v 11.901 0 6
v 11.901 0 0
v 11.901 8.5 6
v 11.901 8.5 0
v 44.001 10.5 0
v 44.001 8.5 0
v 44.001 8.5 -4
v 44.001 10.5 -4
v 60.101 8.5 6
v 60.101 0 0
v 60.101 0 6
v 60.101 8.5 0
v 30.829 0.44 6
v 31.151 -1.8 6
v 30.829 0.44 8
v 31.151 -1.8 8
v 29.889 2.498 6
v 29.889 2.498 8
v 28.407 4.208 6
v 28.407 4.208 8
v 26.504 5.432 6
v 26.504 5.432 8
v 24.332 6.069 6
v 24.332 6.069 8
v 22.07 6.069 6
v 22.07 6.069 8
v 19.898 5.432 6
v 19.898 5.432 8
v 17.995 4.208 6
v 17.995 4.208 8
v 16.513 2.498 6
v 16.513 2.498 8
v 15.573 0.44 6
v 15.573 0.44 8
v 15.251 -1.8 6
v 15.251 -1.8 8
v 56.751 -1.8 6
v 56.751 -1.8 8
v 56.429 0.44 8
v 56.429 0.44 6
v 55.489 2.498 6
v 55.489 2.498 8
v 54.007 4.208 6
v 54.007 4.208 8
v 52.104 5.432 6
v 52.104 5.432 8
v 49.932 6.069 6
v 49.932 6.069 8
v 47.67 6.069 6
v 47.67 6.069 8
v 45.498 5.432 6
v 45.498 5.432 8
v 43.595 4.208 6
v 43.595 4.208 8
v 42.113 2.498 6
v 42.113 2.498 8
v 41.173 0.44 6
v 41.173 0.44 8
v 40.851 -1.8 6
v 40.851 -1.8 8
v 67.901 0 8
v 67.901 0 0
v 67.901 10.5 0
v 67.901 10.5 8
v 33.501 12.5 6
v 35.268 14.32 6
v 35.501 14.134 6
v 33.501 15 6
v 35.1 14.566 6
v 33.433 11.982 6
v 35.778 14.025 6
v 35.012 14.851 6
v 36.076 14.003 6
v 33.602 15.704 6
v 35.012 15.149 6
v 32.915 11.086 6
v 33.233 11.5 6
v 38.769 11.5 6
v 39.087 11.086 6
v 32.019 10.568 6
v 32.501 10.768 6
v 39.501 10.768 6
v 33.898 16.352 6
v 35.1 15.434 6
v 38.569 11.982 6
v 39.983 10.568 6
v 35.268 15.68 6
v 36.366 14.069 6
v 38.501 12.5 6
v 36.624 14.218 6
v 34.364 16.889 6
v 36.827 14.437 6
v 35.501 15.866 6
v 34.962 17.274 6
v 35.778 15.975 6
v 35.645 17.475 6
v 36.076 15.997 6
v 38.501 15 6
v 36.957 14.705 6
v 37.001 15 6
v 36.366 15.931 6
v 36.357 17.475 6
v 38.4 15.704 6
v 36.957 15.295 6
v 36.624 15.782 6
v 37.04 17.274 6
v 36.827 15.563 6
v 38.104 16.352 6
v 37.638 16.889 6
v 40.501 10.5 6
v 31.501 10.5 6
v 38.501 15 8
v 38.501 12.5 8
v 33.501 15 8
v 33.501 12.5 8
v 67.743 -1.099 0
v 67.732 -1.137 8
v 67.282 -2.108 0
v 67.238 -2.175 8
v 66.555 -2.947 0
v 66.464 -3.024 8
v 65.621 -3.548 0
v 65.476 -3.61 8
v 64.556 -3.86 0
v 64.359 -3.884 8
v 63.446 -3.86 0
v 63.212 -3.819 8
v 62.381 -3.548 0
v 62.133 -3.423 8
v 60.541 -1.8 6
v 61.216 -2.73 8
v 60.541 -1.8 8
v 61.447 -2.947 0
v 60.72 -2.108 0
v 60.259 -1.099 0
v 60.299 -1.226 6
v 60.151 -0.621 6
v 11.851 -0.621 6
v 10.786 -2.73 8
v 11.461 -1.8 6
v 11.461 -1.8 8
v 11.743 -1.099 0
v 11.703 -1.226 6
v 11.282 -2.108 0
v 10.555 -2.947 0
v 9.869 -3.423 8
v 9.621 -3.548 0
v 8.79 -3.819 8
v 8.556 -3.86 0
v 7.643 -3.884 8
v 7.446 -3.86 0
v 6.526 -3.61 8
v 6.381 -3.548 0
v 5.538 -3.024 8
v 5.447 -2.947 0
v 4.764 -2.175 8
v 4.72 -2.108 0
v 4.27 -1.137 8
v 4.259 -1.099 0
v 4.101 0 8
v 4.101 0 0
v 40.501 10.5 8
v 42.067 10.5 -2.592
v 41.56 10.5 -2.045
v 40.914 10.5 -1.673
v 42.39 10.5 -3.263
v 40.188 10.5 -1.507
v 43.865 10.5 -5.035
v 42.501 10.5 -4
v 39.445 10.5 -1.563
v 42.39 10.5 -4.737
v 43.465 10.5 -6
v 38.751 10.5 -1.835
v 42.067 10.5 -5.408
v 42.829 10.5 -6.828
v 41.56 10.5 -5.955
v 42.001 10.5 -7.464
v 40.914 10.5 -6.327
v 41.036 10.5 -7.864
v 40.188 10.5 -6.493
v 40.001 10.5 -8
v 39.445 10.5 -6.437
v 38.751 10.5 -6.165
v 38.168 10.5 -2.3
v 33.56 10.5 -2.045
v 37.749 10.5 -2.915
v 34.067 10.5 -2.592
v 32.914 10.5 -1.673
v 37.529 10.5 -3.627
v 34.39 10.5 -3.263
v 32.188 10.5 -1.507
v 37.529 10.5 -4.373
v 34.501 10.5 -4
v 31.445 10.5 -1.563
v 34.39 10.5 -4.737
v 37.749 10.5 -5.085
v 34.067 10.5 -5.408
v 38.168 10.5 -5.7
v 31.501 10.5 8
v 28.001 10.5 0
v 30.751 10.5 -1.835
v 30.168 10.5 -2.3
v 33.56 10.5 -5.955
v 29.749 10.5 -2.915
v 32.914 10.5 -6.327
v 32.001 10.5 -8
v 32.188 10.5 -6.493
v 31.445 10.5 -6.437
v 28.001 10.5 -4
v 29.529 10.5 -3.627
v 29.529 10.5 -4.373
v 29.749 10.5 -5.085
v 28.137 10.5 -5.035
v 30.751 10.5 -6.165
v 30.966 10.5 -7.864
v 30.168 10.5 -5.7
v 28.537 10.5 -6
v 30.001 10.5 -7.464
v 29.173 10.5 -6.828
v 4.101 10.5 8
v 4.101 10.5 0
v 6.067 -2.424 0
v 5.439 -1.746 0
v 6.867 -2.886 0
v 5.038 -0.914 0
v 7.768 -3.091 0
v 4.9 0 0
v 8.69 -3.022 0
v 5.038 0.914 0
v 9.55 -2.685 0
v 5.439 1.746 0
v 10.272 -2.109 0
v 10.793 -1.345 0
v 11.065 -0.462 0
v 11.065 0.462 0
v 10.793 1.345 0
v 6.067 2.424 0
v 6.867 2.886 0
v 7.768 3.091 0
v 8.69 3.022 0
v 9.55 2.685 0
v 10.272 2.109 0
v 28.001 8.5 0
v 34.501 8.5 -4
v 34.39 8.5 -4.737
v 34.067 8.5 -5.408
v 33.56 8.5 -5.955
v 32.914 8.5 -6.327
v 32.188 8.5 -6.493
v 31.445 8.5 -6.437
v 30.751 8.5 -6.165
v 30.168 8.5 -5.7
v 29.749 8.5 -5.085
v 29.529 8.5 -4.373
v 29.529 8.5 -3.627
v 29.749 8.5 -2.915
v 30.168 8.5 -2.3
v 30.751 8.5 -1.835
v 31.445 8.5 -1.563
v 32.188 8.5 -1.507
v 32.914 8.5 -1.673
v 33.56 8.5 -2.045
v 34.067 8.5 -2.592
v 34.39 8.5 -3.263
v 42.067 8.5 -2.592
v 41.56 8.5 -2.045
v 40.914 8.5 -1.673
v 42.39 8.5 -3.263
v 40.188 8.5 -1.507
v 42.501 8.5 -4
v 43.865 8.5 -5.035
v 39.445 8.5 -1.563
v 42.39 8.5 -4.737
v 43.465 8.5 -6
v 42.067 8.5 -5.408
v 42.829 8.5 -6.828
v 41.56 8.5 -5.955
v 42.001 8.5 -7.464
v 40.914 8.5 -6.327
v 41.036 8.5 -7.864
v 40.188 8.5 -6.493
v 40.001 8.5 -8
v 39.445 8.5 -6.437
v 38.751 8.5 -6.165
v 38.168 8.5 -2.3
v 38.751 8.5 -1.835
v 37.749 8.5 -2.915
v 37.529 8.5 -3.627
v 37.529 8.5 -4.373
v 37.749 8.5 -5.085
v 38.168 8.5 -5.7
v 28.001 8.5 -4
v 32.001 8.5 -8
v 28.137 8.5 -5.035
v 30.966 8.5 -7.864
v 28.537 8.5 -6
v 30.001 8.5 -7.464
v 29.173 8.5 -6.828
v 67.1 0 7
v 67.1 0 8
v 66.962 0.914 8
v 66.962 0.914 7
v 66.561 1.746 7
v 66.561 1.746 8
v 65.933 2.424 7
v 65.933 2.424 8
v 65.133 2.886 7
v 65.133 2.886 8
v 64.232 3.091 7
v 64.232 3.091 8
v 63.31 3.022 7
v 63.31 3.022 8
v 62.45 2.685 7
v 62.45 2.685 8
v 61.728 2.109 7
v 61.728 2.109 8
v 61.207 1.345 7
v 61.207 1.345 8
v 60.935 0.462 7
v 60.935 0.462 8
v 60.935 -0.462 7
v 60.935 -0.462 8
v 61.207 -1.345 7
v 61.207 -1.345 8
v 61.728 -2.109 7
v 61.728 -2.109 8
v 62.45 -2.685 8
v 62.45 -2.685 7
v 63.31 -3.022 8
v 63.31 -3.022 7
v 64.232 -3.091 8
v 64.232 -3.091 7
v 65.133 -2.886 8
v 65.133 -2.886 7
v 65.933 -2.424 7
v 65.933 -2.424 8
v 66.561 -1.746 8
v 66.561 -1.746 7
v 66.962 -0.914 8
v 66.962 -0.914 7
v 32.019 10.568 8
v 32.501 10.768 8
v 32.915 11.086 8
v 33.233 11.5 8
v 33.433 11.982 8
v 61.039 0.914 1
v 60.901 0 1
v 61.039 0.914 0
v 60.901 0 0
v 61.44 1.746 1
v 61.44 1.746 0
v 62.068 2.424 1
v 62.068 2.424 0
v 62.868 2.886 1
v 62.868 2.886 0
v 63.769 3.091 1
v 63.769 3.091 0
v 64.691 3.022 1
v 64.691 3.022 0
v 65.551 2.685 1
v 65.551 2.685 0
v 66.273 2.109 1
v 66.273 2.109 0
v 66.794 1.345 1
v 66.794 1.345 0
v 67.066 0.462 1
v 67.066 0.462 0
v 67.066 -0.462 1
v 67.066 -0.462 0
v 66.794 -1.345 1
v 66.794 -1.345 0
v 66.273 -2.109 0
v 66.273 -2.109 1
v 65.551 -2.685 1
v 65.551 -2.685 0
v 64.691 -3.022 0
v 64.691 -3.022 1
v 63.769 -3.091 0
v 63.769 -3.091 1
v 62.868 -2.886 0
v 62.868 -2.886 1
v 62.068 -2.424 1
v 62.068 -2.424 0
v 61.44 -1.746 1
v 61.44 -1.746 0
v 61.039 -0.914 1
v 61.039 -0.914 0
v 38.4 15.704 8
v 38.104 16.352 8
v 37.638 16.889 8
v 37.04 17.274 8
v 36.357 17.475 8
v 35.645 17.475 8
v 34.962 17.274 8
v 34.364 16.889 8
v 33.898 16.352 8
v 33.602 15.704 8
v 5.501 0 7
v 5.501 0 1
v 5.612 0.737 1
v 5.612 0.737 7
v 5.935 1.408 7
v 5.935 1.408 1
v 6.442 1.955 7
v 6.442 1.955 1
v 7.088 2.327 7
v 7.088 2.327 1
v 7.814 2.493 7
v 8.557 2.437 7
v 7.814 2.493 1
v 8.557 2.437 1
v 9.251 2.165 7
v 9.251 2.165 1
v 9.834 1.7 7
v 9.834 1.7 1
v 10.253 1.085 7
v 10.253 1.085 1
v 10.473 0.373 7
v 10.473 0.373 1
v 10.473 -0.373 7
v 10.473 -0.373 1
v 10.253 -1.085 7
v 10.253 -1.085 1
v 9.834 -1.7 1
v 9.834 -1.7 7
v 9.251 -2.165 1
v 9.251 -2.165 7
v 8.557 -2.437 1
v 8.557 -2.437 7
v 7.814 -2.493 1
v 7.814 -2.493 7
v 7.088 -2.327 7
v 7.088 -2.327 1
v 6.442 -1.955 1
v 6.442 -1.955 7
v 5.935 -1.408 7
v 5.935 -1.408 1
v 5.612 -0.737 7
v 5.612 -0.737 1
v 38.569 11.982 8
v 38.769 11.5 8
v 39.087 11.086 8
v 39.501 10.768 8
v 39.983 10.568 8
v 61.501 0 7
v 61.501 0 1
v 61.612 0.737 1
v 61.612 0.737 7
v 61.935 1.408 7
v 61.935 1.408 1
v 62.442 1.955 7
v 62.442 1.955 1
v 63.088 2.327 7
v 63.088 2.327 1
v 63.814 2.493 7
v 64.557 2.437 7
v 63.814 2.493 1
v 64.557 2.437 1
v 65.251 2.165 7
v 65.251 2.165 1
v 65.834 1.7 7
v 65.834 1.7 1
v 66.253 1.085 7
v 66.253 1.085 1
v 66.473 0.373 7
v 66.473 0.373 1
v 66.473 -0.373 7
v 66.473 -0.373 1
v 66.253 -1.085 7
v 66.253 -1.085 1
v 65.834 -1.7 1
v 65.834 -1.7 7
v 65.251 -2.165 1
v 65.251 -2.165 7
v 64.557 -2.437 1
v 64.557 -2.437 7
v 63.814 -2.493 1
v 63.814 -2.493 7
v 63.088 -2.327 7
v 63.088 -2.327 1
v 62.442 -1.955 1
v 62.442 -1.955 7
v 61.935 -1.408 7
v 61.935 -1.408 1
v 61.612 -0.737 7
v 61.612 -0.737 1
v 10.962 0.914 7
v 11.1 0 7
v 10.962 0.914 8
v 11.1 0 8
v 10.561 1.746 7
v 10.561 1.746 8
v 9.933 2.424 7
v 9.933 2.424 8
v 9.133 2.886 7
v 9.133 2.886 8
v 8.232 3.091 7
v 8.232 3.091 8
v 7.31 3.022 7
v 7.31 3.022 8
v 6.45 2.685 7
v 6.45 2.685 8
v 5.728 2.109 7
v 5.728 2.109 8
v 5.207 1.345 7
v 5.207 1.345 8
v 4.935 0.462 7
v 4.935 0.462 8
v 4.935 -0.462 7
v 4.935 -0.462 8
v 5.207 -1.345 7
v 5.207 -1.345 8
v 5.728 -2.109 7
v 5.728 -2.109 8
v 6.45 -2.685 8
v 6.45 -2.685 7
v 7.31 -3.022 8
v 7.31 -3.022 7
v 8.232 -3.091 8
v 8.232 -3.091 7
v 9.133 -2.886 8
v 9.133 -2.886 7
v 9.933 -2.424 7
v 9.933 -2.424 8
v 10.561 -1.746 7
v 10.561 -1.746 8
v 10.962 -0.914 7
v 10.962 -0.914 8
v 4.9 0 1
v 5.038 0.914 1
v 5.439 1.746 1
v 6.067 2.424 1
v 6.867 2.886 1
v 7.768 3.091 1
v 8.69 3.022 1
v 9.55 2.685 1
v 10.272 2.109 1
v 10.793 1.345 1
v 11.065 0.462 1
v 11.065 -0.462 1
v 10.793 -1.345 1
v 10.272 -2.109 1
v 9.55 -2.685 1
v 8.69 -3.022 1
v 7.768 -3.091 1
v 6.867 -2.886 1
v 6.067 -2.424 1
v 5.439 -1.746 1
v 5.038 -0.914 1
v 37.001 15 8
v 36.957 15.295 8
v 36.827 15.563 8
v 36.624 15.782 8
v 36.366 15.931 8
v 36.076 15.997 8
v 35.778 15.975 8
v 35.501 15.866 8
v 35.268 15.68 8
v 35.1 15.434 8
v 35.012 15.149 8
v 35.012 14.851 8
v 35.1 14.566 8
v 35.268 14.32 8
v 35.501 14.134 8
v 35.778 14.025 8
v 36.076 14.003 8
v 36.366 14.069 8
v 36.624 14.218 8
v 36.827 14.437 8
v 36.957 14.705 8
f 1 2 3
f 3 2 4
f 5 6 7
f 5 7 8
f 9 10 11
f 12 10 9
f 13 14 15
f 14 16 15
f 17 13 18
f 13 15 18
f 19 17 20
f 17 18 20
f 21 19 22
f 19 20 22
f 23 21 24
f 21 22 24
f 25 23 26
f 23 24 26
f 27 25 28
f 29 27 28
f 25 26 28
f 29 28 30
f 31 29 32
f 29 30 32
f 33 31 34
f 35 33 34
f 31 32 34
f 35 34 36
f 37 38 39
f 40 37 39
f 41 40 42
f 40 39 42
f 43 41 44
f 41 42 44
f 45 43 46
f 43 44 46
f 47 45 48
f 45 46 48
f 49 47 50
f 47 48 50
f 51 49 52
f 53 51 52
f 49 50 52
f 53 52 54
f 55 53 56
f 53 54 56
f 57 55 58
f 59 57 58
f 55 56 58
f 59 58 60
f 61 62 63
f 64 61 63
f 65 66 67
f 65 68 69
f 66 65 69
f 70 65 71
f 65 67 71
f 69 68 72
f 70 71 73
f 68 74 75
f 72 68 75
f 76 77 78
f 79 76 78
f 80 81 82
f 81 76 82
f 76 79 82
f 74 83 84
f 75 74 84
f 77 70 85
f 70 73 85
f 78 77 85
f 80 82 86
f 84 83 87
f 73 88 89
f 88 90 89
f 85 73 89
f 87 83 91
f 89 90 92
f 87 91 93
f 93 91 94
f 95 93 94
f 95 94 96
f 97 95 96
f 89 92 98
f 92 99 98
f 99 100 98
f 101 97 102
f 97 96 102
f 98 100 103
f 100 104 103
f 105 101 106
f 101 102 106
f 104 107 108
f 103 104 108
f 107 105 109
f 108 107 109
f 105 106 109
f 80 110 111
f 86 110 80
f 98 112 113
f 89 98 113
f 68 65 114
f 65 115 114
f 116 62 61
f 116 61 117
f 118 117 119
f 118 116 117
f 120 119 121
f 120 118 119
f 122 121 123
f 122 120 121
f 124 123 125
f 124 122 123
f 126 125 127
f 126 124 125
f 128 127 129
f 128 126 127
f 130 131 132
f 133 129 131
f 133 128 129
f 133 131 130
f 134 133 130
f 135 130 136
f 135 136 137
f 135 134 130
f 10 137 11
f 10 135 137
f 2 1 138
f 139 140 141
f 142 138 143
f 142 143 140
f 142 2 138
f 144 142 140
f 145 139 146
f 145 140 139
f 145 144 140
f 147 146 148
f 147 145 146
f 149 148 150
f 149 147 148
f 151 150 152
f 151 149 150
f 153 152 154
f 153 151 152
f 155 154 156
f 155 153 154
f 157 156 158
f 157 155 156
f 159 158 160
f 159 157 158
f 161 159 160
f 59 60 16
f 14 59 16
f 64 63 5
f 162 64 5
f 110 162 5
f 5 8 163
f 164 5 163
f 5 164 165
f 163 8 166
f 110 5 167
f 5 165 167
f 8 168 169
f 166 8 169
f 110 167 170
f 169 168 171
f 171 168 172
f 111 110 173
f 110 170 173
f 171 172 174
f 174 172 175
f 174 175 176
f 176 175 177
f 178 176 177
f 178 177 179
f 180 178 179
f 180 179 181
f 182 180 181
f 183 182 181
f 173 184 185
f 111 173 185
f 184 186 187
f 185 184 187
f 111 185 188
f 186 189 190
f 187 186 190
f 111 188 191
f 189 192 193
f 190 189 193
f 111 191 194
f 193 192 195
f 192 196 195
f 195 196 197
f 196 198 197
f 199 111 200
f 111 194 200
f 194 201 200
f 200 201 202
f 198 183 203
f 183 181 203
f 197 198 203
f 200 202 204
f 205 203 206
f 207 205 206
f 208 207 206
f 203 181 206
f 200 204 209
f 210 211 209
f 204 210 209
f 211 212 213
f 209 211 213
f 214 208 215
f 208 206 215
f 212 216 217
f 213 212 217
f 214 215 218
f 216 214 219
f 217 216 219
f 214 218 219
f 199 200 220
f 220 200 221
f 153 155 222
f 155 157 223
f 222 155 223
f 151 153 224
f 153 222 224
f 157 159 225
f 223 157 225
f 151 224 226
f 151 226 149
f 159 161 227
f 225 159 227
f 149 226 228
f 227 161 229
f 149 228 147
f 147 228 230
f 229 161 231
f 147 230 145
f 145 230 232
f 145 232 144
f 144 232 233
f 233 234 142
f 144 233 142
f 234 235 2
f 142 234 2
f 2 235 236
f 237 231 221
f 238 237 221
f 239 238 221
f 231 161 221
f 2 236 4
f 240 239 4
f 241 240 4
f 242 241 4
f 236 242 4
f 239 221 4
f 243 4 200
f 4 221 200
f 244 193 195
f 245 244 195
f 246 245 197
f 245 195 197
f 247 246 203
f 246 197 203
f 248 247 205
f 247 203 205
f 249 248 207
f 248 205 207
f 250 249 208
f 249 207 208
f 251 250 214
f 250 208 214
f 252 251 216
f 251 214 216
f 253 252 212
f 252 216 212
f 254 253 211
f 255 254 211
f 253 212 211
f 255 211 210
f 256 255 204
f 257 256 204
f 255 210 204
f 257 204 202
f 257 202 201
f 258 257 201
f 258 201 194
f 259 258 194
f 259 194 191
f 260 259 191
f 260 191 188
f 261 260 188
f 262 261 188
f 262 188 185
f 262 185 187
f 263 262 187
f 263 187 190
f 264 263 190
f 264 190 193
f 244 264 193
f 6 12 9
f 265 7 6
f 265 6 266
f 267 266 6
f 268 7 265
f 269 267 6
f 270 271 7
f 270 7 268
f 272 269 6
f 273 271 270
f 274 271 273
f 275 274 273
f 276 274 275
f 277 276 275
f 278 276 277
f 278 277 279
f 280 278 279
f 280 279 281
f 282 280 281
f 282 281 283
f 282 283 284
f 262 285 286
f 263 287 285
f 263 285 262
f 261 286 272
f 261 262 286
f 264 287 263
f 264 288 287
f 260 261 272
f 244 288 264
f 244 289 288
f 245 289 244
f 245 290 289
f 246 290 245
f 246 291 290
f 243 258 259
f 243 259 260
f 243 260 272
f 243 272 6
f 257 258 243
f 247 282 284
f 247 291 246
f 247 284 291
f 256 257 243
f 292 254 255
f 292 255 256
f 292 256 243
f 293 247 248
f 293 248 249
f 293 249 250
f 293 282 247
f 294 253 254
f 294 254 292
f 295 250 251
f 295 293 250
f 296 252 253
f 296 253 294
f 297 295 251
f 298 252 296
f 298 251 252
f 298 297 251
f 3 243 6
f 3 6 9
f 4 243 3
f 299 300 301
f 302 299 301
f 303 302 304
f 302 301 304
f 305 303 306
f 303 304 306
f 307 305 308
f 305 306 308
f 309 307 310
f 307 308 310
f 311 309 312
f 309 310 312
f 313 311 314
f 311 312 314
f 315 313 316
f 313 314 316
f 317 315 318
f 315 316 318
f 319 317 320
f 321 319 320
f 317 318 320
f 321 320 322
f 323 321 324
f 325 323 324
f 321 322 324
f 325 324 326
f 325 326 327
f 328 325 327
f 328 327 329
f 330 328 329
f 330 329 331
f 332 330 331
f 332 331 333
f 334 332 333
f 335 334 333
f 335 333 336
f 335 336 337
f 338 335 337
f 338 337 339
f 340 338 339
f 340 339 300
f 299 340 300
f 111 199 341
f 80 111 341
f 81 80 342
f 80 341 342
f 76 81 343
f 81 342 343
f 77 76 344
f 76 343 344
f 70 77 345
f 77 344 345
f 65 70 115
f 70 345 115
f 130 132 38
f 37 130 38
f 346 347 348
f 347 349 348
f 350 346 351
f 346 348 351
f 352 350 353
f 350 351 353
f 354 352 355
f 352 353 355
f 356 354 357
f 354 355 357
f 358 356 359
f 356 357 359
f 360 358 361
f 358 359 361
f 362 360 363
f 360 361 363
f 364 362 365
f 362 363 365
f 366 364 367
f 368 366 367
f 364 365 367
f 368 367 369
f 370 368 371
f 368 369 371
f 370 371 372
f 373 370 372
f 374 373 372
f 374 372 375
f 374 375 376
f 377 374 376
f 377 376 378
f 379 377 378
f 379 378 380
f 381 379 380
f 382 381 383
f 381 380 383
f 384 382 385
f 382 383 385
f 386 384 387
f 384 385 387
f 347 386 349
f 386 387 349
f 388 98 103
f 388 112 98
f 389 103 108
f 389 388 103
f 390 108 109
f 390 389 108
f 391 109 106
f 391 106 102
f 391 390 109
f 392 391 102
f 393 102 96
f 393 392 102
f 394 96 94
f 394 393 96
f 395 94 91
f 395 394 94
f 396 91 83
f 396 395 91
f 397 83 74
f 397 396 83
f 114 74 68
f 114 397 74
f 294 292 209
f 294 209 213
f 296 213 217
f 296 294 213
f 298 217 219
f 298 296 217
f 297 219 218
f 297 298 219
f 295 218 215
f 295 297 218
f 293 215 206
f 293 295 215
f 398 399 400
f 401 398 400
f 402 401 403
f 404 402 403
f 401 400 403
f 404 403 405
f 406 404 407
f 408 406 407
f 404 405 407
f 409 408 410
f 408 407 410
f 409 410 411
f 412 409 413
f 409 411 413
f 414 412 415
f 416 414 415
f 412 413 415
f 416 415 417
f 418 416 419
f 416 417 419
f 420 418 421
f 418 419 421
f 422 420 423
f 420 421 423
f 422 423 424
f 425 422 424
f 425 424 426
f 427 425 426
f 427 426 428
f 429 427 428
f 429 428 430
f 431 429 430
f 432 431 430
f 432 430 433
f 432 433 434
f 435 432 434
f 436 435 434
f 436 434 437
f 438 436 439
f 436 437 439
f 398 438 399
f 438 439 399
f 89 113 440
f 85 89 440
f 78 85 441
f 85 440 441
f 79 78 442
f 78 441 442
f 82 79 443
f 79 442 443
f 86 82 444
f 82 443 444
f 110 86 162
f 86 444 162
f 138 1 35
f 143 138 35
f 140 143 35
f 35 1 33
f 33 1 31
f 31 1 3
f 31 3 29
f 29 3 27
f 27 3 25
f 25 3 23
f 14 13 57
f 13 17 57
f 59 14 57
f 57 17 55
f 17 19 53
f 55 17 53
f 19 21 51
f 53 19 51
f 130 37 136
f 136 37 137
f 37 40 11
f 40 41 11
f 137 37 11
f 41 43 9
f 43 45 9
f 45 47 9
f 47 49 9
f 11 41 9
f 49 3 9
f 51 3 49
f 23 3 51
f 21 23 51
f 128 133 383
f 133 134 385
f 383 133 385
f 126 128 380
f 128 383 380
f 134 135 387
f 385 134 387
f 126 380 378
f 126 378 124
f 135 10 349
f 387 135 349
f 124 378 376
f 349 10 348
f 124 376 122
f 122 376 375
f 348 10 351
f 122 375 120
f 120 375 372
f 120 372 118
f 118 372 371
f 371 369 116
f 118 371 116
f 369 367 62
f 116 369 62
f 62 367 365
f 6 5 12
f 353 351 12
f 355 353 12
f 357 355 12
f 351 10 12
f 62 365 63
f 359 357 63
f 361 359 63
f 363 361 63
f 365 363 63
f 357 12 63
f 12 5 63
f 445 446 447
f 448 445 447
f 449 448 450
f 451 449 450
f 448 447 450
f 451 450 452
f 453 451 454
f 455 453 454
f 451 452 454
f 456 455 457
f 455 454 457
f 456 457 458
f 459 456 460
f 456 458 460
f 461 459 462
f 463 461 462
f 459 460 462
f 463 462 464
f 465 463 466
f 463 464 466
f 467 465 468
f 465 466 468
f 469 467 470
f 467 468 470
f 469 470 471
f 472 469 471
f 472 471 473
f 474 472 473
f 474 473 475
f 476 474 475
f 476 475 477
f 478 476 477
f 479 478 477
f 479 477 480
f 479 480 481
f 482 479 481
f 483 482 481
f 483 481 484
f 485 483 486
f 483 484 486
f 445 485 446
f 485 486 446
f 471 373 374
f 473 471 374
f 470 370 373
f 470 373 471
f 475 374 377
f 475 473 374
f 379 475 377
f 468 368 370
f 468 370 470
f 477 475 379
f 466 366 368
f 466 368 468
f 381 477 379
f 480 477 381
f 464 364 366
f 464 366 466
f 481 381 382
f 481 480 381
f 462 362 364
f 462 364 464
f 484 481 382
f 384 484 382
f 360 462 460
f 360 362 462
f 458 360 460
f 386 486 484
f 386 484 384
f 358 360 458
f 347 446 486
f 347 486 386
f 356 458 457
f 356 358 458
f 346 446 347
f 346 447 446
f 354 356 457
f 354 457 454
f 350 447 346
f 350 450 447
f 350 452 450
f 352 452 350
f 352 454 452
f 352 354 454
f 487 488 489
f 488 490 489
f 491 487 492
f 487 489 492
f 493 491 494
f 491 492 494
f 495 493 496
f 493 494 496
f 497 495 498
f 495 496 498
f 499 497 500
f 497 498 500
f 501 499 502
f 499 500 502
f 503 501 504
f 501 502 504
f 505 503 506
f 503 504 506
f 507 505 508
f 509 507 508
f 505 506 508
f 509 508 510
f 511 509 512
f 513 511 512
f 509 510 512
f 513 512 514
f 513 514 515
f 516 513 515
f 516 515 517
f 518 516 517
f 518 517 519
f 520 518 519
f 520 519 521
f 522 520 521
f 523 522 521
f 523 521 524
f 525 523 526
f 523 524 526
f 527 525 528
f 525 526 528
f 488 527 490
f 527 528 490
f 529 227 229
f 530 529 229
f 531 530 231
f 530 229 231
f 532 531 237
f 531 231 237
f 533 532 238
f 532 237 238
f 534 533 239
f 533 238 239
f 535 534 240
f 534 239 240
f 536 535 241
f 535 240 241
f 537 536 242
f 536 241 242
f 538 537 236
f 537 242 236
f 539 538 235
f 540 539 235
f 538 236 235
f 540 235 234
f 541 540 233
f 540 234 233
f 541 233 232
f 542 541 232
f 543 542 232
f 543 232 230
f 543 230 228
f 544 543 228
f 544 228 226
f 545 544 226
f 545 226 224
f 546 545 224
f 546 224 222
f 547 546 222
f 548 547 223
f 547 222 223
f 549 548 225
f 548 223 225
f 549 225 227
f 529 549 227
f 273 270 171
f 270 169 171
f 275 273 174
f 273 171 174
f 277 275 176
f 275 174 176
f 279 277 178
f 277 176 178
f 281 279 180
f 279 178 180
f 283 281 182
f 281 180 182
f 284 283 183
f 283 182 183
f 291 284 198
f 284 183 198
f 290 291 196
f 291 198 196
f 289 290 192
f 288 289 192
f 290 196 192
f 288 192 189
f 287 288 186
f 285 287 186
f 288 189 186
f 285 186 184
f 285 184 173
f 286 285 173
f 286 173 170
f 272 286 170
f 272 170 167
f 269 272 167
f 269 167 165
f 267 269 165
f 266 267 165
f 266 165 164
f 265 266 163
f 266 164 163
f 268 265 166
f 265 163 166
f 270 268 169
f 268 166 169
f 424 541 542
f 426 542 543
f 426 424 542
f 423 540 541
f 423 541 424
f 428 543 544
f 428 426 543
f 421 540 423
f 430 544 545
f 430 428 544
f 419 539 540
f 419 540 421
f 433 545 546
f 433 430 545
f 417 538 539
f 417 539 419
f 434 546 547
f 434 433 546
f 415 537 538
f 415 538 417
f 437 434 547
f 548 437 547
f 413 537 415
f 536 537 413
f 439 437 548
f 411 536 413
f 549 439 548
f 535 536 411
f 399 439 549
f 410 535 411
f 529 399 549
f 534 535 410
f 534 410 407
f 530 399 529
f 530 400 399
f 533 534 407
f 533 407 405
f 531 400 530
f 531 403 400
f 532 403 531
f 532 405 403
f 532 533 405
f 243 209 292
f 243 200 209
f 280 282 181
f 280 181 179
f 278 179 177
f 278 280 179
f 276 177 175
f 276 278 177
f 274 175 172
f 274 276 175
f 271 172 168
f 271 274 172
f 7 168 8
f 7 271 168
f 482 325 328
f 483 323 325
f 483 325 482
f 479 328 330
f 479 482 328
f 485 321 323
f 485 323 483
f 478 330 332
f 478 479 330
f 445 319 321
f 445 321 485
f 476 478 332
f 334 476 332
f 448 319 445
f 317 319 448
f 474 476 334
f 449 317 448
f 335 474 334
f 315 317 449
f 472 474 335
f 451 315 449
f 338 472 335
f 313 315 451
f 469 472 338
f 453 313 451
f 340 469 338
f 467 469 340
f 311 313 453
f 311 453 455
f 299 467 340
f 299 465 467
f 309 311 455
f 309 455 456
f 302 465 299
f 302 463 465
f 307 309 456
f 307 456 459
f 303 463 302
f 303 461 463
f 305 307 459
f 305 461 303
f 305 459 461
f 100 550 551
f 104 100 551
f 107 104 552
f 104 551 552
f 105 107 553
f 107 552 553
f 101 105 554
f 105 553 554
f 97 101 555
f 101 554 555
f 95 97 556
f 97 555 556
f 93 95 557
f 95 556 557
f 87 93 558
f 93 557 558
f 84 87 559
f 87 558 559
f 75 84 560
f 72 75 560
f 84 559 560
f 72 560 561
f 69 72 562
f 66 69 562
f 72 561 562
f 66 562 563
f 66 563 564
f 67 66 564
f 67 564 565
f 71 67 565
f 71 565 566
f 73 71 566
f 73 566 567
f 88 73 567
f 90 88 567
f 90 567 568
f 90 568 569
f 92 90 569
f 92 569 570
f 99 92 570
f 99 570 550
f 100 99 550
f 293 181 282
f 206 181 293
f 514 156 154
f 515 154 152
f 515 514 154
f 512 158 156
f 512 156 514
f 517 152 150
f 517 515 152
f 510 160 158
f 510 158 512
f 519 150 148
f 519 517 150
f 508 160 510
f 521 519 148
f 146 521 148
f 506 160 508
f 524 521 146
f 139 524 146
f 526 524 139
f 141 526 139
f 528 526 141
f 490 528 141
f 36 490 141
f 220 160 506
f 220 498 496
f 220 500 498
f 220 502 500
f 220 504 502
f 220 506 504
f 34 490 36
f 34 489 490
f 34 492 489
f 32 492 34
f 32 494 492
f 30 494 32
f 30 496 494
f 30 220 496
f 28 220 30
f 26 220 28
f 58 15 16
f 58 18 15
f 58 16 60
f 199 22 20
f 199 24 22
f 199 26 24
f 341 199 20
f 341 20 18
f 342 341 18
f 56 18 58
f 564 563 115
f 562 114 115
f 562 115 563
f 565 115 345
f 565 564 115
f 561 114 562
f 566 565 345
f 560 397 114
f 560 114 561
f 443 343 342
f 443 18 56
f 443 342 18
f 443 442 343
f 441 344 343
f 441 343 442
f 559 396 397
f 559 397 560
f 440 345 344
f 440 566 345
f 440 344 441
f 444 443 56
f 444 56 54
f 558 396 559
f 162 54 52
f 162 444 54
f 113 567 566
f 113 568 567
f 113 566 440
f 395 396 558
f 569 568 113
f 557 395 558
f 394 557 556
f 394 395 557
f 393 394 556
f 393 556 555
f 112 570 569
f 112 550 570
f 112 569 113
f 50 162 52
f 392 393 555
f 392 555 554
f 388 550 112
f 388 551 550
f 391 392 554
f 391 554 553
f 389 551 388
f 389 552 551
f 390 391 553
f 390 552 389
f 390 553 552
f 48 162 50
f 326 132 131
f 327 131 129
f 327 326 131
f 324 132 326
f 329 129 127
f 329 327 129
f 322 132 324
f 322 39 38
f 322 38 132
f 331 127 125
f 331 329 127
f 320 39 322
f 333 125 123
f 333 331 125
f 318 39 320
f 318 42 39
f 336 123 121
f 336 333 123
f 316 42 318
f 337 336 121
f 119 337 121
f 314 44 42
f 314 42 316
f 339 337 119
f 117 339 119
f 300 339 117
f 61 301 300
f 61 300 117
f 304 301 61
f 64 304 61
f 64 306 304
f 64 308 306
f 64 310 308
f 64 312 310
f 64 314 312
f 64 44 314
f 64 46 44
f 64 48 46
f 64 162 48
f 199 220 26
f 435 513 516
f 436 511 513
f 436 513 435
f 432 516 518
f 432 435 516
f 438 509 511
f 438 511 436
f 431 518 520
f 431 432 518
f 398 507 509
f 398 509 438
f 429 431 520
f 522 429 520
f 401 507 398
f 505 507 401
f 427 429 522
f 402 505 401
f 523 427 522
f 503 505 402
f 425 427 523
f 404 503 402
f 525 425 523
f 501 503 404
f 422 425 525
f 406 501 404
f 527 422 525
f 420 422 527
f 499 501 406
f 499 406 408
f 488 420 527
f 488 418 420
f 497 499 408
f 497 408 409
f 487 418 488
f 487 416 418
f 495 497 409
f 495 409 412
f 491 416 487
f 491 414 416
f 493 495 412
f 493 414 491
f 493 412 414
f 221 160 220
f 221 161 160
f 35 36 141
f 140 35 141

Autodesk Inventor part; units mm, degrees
ref_plane "YZ Plane" through (0, 0, 0) normal (1, 0, 0) x (0, 1, 0)
ref_plane "XZ Plane" through (0, 0, 0) normal (0, 1, 0) x (-1, 0, 0)
ref_plane "XY Plane" through (0, 0, 0) normal (0, 0, 1) x (1, 0, 0)
sketch "Esboço1" plane through (0, 0, 0) normal (0, 0, 1) x (1, 0, 0)
  circle A0 centre (8.001, 0) radius 2.4 projected
  circle A1 centre (8.001, 0) radius 2.4
  circle A2 centre (64.001, 0) radius 2.4 projected
  circle A3 centre (64.001, 0) radius 2.4
  line L0 (58.601, 8.5) -> (13.401, 8.5) projected
  line L1 (58.601, -12.1) -> (58.601, 8.5) projected
  line L2 (13.401, 8.5) -> (13.401, -12.1) projected
  line L3 (67.806, 3.9) -> (60.196, 3.9) projected
  arc A4 (60.101, 0) -> (67.901, 0) centre (64.001, 0) ccw
  line L4 (60.101, 0) -> (60.101, 8.5)
  line L5 (60.101, 8.5) -> (11.901, 8.5)
  arc A5 (4.101, 0) -> (11.901, 0) centre (8.001, 0) ccw
  line L6 (11.901, 0) -> (11.901, 8.5)
  line L7 (4.101, 0) -> (4.101, 8.5)
  line L8 (4.101, 8.5) -> (4.101, 10.5)
  line L9 (67.901, 0) -> (67.901, 10.2879)
  line L10 (67.901, 10.5) -> (4.101, 10.5)
  line L11 (67.901, 10.1485) -> (67.901, 10.5)
  point P0 (0, 0)
  dimension "d0" = 7.8
  dimension "d1" = 2
extrude "Extrusão1" add sketch "Esboço1" along normal blind 8
sketch "Esboço3" plane through (0, 0, 8) normal (0, 0, 1) x (1, 0, 0)
  circle A0 centre (23.201, -1.8) radius 7.95 projected
  circle A1 centre (48.801, -1.8) radius 7.95 projected
  arc A2 (60.101, 0) -> (67.901, 0) centre (64.001, 0) ccw projected
  line L0 (11, -1.8) -> (11, 9)
  line L1 (11, 9) -> (60.5412, 9)
  line L2 (60.5412, 9) -> (60.5412, -1.8)
  line L3 (15.251, -1.8) -> (11, -1.8)
  line L4 (60.5412, -1.8) -> (56.751, -1.8)
  line L5 (40.851, -1.8) -> (31.151, -1.8)
  point P0 (0, 0)
extrude "Extrusão2" add sketch "Esboço3" against normal blind 2 contours A0 L3 L0 L1 L2 L4 A1 L5
sketch "Esboço4" plane through (0, 0, 8) normal (0, 0, 1) x (1, 0, 0)
  circle A0 centre (8, 0) radius 3.1
  circle A1 centre (64.001, 0) radius 2.4 projected
  circle A2 centre (64, 0) radius 3.1
  circle A3 centre (8.001, 0) radius 2.4 projected
  point P0 (0, 0)
  dimension "d6" = 6.2
  dimension "d7" = 6.2
extrude "Extrusão3" cut sketch "Esboço4" against normal blind 1
sketch "Esboço5" plane through (0, 0, 0) normal (0, 0, -1) x (-1, 0, 0)
  circle A0 centre (-8, 0) radius 3.1
  circle A1 centre (-8.001, 0) radius 2.4 projected
  circle A2 centre (-64.001, 0) radius 2.4 projected
  circle A3 centre (-64.001, 0) radius 3.1 projected
  point P0 (0, 0)
  dimension "d10" = 6.2
extrude "Extrusão4" cut sketch "Esboço5" against normal blind 1
sketch "Esboço6" plane through (0, 0, 8) normal (0, 0, 1) x (1, 0, 0)
  line L0 (33.501, 12.5) -> (33.501, 15)
  line L1 (38.501, 15) -> (38.501, 12.5)
  line L2 (4.101, 10.5) -> (4.101, 0) projected
  line L3 (-3.999, -3.9) -> (-3.999, 3.9) projected
  circle A0 centre (36.001, 15) radius 1
  circle A1 centre (36.001, 15) radius 2.5
  arc A2 (31.501, 10.5) -> (33.501, 12.5) centre (31.501, 12.5) ccw
  arc A3 (38.501, 12.5) -> (40.501, 10.5) centre (40.501, 12.5) ccw
  line L4 (40.501, 10.5) -> (31.501, 10.5)
  line L5 (67.901, 10.5) -> (4.101, 10.5) projected
  point P0 (0, 0)
  dimension "d19" = 29.4
  dimension "d20" = 2
  dimension "d22" = 2
  dimension "d23" = 2
extrude "Extrusão5" add sketch "Esboço6" against normal blind 2
sketch "Esboço8" plane through (0, 0, 0) normal (0, 0, -1) x (-1, 0, 0)
  line L0 (-28.001, 3.9) -> (-28.001, 3.6) projected
  line L1 (-11.901, 8.5) -> (-60.101, 8.5) projected
  line L2 (-67.901, 10.5) -> (-4.101, 10.5) projected
  line L3 (-28.001, 8.5) -> (-44.001, 8.5)
  line L4 (-44.001, 8.5) -> (-44.001, 10.5)
  line L5 (-44.001, 10.5) -> (-28.001, 10.5)
  line L6 (-28.001, 10.5) -> (-28.001, 8.5)
  point P0 (0, 0)
  dimension "d24" = 16
extrude "Extrusão6" add sketch "Esboço8" along normal blind 8
sketch "Esboço9" plane through (11.901, 8.5, 6) normal (0, -1, 0) x (1, 0, 0)
  circle A0 centre (28.1, -10) radius 2.4 projected
  circle A1 centre (20.1, -10) radius 2.4 projected
  arc A2 (16.1, -10) -> (20.1, -14) centre (20.1, -10) ccw
  line L0 (32.1, -14) -> (16.1, -14) projected
  arc A3 (28.1, -14) -> (32.1, -10) centre (28.1, -10) ccw
  line L1 (32.1, -6) -> (32.1, -14) projected
  line L2 (16.1, -10) -> (16.1, -14)
  line L3 (32.1, -14) -> (32.1, -10)
  line L4 (16.1, -14) -> (20.1, -14)
  line L5 (28.1, -14) -> (32.1, -14)
  point P0 (-11.901, -6)
  point P1 (28.1, -14)
extrude "Extrusão7" cut sketch "Esboço9" against normal blind 6.75
sketch "Esboço10" plane through (64.001, 0, 1) normal (0, 0, -1) x (-1, 0, 0)
  circle A0 centre (0, 0) radius 2.4 projected
  circle A1 centre (56, 0) radius 2.4 projected
  circle A2 centre (0, 0) radius 2.5
  circle A3 centre (56, 0) radius 2.5
  point P0 (64.001, 0)
  dimension "d29" = 5
  dimension "d30" = 5
extrude "Extrusão8" cut sketch "Esboço10" against normal blind 15.25
sketch "Esboço11" plane through (4.101, 10.5, 8) normal (0, 1, 0) x (1, 0, 0)
  circle A0 centre (27.9, 12) radius 2.4 projected
  circle A1 centre (35.9, 12) radius 2.4 projected
  circle A2 centre (27.9, 12) radius 2.5
  circle A3 centre (35.9, 12) radius 2.5
  point P0 (-4.101, 8)
  dimension "d33" = 5
  dimension "d34" = 5
extrude "Extrusão9" cut sketch "Esboço11" against normal blind 10
properties part number "apoio ultrassonico"
